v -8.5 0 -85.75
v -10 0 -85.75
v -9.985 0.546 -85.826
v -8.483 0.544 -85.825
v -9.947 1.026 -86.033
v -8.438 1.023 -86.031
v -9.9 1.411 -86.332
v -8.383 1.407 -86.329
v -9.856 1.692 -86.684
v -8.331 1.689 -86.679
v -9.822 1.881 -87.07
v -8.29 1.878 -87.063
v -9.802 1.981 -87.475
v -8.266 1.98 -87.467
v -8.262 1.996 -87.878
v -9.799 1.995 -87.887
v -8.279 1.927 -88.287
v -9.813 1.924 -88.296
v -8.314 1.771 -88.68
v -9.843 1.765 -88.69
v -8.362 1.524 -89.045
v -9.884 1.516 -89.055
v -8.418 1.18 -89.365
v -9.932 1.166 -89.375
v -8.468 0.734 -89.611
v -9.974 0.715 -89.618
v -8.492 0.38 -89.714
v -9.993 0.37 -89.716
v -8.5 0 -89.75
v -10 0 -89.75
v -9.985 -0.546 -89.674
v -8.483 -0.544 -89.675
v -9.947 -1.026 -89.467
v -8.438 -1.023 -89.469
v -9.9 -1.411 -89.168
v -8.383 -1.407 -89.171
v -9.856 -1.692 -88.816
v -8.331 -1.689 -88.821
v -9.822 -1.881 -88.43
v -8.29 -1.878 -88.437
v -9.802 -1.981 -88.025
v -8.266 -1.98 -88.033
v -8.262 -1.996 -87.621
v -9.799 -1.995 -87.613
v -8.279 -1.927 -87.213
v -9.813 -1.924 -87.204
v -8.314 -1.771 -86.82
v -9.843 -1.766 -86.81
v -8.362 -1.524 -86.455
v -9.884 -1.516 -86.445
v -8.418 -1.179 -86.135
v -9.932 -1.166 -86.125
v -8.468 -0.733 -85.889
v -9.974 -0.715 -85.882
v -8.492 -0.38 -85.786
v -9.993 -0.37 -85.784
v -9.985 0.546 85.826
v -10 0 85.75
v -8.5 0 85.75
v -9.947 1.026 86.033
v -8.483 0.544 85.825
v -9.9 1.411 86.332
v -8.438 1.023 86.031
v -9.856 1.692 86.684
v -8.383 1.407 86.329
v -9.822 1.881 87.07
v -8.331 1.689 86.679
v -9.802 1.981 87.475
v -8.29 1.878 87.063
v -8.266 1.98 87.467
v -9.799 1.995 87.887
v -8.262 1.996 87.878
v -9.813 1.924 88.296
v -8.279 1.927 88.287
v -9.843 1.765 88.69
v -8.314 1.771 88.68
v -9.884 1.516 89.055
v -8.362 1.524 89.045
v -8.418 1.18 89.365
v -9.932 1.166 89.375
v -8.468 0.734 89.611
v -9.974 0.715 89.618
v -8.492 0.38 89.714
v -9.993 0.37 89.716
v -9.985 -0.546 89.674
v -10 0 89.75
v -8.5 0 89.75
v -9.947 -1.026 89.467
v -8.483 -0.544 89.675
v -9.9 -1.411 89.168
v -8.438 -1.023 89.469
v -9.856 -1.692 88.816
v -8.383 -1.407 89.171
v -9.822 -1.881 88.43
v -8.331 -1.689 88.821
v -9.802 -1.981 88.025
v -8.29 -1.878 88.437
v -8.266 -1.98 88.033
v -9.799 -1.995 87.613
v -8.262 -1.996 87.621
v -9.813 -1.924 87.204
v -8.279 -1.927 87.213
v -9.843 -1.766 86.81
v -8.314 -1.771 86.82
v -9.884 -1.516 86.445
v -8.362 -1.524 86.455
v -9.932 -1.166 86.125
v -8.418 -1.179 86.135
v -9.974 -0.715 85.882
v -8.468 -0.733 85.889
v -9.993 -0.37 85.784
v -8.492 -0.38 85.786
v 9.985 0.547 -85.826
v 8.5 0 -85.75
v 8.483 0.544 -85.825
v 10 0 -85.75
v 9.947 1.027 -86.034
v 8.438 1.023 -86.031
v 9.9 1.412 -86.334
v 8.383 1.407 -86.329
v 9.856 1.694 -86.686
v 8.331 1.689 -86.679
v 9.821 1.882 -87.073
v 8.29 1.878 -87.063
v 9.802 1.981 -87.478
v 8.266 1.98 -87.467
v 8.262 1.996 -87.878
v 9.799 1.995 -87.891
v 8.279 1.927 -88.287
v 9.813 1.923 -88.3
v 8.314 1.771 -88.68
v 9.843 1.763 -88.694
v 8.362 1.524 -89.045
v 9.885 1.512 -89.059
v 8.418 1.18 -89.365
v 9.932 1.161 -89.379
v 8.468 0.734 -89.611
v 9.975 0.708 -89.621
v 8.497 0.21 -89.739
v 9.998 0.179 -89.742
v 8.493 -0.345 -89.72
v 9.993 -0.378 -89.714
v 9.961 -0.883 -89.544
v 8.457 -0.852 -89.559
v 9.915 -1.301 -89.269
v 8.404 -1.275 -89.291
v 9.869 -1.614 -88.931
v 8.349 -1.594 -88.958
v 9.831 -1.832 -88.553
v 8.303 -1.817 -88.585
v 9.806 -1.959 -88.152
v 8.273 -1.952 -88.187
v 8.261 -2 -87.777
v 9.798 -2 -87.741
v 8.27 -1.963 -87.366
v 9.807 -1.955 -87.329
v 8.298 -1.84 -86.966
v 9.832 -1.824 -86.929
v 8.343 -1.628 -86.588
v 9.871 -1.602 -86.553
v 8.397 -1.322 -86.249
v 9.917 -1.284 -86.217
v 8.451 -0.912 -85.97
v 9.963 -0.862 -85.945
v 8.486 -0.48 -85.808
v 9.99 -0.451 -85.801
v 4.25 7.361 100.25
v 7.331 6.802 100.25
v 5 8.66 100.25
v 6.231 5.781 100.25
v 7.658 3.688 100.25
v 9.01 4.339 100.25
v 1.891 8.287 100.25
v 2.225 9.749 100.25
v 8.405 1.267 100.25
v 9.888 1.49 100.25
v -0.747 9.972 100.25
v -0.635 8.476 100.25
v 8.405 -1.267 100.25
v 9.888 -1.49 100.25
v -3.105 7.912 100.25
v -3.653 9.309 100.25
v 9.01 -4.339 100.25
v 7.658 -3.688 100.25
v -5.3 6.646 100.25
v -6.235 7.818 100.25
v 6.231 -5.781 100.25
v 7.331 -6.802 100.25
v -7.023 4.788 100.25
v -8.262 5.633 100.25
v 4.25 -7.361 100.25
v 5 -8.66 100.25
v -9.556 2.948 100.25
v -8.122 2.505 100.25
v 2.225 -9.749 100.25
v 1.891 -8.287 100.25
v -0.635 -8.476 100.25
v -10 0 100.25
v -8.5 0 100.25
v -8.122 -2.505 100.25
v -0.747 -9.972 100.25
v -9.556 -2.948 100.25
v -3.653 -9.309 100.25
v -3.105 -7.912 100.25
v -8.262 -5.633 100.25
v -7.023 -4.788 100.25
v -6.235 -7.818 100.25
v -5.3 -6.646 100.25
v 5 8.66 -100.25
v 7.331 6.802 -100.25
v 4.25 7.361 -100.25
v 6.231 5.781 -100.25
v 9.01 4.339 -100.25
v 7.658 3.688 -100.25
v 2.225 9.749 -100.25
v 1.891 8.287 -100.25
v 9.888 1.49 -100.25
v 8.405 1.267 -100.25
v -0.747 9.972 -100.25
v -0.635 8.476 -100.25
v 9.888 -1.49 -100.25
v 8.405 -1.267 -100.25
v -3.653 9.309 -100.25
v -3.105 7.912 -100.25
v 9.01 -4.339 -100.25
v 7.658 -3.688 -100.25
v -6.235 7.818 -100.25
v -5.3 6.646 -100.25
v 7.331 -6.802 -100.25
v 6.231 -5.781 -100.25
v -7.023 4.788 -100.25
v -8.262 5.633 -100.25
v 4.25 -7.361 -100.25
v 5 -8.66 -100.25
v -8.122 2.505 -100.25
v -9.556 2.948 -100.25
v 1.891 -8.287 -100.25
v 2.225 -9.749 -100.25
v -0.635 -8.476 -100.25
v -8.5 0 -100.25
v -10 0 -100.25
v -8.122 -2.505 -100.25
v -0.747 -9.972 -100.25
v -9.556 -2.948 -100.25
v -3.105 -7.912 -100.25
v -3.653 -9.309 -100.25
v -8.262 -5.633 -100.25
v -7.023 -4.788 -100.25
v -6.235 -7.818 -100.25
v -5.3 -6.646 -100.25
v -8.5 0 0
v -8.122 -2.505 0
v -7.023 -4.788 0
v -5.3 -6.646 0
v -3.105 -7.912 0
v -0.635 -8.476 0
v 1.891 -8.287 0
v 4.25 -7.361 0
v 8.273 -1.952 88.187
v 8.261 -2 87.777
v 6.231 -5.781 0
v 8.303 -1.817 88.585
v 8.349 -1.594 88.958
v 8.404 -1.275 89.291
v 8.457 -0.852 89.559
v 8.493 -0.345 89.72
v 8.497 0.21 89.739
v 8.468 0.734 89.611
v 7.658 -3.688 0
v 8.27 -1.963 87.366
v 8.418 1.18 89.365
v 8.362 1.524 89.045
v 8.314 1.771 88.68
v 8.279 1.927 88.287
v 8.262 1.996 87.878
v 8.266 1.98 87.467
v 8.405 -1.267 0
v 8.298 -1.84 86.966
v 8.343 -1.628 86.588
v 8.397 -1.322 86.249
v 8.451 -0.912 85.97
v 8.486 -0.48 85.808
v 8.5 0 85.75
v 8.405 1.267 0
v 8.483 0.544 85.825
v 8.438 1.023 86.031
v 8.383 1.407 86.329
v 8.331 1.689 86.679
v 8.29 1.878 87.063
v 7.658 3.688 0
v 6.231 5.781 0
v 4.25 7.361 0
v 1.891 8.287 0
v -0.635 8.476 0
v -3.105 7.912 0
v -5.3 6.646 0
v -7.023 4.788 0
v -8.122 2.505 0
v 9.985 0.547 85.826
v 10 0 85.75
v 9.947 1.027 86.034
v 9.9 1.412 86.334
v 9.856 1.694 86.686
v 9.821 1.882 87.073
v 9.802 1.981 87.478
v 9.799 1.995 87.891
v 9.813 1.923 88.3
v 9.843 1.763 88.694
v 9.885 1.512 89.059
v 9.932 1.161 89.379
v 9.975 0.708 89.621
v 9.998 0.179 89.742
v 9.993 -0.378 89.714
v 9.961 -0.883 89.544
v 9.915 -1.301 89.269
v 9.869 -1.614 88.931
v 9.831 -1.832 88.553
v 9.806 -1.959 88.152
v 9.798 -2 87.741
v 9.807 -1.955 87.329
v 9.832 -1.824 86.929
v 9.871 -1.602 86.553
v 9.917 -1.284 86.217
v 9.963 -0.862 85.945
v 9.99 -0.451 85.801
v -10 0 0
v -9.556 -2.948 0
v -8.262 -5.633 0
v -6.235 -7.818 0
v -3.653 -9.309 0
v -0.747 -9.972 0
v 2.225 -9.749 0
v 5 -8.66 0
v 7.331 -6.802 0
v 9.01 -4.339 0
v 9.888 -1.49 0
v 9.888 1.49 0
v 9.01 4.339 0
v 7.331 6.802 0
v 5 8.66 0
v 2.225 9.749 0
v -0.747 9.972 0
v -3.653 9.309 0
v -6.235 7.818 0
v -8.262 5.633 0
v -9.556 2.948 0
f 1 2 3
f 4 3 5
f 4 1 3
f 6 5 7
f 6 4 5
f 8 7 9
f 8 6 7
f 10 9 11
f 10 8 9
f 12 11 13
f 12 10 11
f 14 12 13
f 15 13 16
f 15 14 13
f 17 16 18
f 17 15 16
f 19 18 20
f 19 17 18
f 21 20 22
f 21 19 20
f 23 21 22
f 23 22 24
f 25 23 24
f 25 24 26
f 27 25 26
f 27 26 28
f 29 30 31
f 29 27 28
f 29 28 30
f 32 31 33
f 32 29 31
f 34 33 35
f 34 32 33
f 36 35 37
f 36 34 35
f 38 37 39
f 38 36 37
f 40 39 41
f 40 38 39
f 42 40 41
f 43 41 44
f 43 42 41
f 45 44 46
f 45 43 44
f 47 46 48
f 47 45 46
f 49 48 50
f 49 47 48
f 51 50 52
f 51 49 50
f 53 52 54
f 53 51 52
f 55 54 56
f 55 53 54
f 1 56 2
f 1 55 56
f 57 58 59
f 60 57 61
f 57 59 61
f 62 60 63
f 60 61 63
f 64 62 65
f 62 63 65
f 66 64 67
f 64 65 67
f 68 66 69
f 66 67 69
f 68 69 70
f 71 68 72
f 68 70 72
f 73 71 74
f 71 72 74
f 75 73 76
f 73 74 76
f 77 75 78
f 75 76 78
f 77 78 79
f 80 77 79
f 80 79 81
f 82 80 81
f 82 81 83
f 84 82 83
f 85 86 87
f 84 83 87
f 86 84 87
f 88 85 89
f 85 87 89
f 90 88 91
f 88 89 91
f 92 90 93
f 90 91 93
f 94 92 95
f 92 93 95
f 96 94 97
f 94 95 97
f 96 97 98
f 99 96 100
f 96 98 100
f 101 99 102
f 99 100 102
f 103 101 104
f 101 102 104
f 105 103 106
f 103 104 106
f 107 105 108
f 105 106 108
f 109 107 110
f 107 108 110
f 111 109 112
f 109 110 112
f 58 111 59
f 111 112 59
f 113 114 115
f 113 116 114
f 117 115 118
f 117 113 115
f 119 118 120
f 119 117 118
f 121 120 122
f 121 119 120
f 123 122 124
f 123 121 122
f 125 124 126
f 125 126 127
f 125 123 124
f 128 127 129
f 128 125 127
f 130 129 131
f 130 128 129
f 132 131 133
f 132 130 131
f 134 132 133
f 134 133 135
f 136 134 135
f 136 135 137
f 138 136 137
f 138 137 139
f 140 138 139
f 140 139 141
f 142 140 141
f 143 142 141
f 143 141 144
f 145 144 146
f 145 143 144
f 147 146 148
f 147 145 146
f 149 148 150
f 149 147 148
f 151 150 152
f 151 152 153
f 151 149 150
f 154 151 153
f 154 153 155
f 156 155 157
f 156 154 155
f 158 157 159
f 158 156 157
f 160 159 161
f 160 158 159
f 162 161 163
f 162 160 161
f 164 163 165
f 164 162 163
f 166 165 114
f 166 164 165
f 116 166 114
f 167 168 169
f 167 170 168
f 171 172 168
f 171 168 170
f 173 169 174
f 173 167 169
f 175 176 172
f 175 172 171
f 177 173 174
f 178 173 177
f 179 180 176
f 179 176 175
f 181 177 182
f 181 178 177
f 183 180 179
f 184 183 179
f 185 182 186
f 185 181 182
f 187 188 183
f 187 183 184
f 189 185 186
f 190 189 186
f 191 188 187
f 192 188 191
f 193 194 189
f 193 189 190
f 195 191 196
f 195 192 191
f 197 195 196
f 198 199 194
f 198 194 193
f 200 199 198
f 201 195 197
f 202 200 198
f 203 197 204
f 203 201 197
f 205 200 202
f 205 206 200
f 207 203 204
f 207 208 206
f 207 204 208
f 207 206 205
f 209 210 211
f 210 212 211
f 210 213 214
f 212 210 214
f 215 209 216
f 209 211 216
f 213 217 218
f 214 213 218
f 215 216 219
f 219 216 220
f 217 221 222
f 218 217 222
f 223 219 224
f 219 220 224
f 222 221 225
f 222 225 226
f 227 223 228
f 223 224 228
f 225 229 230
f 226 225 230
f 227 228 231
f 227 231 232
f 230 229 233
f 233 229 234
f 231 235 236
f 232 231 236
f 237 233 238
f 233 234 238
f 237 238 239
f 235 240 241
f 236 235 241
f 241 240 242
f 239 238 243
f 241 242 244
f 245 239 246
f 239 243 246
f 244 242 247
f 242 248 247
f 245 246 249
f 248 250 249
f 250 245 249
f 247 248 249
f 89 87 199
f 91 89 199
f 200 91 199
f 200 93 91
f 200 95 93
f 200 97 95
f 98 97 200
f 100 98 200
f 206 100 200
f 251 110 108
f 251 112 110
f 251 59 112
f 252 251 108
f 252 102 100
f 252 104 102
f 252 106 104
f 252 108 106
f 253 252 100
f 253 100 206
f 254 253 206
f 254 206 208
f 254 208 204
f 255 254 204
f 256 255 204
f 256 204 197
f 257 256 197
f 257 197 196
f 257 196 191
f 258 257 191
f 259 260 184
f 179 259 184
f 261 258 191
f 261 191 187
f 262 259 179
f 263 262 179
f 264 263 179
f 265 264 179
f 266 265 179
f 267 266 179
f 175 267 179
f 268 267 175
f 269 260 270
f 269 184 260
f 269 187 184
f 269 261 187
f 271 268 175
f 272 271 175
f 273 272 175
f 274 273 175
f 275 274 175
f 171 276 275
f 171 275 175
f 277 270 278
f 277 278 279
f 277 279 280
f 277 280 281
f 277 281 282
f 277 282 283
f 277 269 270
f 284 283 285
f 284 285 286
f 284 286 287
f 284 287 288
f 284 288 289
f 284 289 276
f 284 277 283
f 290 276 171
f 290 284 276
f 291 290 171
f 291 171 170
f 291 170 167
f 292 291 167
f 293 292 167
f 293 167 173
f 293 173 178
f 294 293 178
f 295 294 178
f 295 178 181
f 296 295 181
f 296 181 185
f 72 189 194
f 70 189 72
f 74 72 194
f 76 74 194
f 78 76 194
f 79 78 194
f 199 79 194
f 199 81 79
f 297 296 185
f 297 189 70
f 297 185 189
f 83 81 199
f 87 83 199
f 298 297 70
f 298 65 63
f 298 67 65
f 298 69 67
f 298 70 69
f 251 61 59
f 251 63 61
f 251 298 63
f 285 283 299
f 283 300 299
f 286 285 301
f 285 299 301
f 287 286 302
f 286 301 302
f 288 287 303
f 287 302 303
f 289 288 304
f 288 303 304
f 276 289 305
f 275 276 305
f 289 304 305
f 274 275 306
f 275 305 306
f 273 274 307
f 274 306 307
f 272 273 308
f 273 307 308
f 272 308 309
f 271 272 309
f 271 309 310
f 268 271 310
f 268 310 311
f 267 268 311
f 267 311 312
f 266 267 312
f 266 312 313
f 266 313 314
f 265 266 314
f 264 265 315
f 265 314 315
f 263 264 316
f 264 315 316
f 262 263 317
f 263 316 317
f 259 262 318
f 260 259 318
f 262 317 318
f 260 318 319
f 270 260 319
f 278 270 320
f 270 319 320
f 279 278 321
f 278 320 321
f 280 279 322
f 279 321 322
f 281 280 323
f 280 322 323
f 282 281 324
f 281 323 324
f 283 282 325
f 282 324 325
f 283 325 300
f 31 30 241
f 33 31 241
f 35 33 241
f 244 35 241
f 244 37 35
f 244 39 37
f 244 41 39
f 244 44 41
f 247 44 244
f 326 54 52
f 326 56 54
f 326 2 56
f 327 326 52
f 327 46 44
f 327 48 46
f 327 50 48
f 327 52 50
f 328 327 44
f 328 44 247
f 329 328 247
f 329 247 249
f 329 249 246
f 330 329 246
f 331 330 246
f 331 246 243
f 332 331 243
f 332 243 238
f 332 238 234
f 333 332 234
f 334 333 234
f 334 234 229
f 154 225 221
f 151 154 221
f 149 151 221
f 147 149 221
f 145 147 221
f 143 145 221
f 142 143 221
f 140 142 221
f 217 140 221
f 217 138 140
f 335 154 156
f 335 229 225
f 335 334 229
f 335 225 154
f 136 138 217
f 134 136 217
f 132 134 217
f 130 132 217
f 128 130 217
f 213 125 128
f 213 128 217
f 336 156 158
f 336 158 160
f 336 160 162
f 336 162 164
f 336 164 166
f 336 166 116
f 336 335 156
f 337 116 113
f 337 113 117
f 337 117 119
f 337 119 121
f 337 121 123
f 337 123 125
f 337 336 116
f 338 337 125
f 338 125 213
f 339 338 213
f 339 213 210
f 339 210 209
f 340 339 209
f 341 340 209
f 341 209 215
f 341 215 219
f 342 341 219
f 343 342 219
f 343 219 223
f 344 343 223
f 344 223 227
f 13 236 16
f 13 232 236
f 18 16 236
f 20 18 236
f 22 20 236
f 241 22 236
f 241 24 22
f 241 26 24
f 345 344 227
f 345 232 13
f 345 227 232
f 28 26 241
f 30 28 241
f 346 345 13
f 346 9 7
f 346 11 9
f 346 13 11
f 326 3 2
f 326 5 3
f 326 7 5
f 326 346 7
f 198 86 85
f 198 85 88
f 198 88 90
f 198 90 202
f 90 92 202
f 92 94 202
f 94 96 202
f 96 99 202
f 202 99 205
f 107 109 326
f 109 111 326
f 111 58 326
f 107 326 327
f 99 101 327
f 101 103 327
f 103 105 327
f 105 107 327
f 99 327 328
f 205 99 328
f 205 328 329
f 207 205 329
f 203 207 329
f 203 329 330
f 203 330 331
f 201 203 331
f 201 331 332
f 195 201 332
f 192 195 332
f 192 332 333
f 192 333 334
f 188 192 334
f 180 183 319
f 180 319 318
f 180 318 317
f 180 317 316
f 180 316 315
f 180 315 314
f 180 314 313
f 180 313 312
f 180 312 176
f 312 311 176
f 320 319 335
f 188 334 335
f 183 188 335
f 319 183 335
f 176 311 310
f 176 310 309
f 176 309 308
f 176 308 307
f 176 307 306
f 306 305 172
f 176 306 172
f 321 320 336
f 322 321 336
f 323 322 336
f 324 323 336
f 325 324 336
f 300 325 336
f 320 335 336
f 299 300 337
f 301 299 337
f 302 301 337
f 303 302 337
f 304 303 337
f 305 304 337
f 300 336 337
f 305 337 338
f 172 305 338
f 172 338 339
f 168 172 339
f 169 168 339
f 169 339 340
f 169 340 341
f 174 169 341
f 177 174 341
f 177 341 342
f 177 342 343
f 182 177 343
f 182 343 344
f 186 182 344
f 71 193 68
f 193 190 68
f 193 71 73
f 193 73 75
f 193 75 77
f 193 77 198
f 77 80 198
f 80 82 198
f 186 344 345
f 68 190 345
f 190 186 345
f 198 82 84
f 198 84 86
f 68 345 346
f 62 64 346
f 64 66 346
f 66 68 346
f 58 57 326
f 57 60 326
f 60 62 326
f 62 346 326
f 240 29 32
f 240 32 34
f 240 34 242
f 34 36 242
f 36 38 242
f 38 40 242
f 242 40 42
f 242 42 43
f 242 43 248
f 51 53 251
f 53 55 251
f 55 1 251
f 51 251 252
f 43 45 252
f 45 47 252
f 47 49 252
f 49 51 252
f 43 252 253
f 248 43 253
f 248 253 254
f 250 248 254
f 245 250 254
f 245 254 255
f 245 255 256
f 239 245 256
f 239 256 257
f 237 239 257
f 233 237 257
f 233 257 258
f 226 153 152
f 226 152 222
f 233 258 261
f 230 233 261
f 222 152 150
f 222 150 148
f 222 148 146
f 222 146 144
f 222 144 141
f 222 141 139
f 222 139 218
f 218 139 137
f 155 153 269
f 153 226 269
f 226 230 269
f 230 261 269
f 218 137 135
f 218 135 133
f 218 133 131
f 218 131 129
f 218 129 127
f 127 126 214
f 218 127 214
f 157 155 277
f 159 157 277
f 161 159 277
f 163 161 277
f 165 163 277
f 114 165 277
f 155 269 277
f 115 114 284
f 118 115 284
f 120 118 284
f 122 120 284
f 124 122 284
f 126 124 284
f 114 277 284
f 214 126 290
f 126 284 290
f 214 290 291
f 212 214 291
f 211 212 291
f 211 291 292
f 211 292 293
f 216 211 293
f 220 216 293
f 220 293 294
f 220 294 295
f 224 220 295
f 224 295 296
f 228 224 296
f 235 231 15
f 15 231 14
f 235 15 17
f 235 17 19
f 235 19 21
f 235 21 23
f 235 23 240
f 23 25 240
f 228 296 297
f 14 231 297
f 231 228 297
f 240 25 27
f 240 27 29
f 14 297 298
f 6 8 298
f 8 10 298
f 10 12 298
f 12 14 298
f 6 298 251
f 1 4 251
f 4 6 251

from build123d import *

# Parameters (mm, degrees)
SKETCH1_R           = 10
SKETCH1_R_2         = 8.5
BOSS_EXTRUDE1_DEPTH = 100.25
SKETCH2_R           = 2
CUT_EXTRUDE1_DEPTH  = 102.242592322


with BuildPart() as part:
    # Sketch1 → Boss-Extrude1 (new body)
    with BuildSketch(Plane.XY):
        with Locations(Location((0, 0, 0), (0, 0, 180))):
            Circle(SKETCH1_R)
        with Locations(Location((0, 0, 0), (0, 0, 180))):
            Circle(SKETCH1_R_2, mode=Mode.SUBTRACT)
    boss_extrude1 = extrude(amount=BOSS_EXTRUDE1_DEPTH)

    # Sketch2 → Cut-Extrude1 (cut, symmetric)
    with BuildSketch(Plane(origin=(0, 0, 0), x_dir=(0, 0, -1), z_dir=(1, 0, 0))):
        with Locations((-87.75, 0)):
            Circle(SKETCH2_R)
    cut_extrude1 = extrude(amount=CUT_EXTRUDE1_DEPTH, both=True, mode=Mode.SUBTRACT)

    # Mirror1: Boss-Extrude1, Cut-Extrude1 across plane
    add(boss_extrude1.mirror(Plane.XY))
    add(cut_extrude1.mirror(Plane.XY), mode=Mode.SUBTRACT)


solid = part.part
